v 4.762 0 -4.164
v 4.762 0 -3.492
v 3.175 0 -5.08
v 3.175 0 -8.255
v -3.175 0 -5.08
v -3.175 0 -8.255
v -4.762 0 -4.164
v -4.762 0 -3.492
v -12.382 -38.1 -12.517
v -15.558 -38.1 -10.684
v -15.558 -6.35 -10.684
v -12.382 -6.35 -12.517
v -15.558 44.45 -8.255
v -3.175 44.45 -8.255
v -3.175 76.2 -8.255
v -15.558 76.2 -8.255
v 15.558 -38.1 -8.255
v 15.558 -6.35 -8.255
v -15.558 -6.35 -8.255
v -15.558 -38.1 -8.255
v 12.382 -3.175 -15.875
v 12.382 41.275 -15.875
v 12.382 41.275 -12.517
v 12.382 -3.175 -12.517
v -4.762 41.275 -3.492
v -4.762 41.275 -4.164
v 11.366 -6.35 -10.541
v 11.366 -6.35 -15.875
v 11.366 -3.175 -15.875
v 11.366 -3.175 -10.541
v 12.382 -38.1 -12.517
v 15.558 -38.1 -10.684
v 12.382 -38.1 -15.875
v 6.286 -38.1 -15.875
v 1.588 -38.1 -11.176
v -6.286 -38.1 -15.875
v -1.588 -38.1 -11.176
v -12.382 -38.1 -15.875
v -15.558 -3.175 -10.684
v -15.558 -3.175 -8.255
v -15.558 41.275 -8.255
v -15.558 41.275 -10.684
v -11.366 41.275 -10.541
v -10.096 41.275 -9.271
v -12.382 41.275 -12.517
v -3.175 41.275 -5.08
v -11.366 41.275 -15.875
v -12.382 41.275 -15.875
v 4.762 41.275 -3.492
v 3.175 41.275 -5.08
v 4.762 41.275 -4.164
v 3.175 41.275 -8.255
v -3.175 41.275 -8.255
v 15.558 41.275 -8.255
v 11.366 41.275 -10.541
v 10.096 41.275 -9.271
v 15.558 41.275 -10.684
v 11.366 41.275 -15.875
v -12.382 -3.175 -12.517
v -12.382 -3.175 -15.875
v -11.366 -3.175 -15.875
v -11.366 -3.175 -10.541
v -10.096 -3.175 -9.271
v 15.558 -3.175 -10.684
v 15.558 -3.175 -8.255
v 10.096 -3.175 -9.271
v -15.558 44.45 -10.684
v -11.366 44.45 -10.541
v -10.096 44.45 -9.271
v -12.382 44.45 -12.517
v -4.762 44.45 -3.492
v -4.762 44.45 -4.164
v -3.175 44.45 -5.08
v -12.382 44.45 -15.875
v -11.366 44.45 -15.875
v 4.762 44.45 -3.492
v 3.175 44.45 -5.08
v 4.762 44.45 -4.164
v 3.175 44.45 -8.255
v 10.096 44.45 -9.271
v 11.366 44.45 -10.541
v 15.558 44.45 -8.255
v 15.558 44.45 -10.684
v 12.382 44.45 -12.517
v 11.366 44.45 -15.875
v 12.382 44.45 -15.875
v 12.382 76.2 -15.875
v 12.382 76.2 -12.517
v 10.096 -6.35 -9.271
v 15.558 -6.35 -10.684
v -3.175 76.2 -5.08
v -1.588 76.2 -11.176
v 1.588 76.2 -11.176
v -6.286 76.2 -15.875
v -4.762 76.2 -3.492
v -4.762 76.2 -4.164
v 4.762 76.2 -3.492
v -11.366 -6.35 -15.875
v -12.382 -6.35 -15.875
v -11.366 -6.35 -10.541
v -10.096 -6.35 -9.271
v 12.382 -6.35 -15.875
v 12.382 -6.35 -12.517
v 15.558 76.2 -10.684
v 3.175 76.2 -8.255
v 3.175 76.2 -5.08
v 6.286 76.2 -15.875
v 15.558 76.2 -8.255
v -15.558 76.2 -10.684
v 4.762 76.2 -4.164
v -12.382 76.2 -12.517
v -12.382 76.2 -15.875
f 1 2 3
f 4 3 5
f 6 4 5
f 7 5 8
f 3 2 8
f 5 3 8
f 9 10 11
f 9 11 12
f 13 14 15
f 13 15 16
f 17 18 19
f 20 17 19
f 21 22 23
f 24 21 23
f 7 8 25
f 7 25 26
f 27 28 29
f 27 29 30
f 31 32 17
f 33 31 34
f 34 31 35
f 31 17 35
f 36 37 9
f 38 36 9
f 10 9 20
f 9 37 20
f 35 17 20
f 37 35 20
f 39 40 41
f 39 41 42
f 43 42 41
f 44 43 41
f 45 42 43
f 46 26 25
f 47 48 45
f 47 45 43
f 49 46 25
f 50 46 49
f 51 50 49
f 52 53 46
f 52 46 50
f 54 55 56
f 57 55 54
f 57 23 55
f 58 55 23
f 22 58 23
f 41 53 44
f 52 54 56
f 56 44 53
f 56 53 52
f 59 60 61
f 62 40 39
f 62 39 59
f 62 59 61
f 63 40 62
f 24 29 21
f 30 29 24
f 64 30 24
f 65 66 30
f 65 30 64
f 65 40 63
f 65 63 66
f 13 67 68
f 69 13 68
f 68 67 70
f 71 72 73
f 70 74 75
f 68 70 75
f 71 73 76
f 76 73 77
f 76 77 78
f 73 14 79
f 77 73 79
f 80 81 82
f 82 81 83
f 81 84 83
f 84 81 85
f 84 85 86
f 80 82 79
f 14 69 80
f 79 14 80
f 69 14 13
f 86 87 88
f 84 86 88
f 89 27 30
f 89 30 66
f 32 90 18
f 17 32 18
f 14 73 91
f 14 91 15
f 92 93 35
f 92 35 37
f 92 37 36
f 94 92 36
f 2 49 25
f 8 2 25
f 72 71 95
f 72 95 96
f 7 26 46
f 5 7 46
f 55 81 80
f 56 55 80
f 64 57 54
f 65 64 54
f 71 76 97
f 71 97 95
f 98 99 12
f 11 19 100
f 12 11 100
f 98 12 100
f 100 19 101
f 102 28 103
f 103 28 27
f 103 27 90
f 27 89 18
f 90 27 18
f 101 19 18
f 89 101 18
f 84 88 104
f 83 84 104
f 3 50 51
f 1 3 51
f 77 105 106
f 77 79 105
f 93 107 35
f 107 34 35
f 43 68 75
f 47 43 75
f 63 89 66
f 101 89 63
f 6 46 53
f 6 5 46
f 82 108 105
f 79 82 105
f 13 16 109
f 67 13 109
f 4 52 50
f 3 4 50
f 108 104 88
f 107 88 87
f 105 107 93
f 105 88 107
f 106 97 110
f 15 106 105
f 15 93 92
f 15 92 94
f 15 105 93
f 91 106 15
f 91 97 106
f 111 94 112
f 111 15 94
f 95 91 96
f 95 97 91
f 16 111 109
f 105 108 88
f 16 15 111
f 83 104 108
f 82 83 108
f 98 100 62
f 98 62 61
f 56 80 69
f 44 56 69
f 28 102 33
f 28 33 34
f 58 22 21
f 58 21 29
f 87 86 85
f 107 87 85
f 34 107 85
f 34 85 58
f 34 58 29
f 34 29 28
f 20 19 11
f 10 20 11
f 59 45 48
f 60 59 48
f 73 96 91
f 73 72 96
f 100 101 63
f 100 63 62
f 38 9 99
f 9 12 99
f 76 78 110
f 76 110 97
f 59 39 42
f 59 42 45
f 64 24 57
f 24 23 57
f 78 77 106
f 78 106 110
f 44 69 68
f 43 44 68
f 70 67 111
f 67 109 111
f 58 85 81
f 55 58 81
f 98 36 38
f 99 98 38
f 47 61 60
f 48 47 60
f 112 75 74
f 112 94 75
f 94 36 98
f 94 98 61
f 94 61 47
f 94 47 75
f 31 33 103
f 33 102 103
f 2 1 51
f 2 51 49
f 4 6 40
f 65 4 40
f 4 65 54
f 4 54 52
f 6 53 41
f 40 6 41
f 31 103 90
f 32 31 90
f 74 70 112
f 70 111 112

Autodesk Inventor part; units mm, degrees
ref_plane "YZ Plane" through (0, 0, 0) normal (1, 0, 0) x (0, 1, 0)
ref_plane "XZ Plane" through (0, 0, 0) normal (0, 1, 0) x (-1, 0, 0)
ref_plane "XY Plane" through (0, 0, 0) normal (0, 0, 1) x (1, 0, 0)
sketch "Sketch1" plane through (0, 0, 0) normal (0, 1, 0) x (-1, 0, 0)
  line L0 (12.7, -15.875) -> (12.7, -12.7) construction
  line L1 (12.7, -12.7) -> (15.875, -10.8669) construction
  line L2 (15.875, -10.8669) -> (15.875, -7.9375) construction
  line L3 (15.875, -7.9375) -> (6.35, -7.9375) construction
  line L4 (6.35, -7.9375) -> (6.35, -3.175) construction
  line L5 (6.35, -3.175) -> (3.175, -3.175) construction
  line L6 (3.175, -3.175) -> (3.175, -6.35) construction
  line L7 (3.175, -6.35) -> (4.7625, -7.2665) construction
  line L8 (4.7625, -7.2665) -> (4.7625, -7.9375) construction
  line L9 (4.7625, -7.9375) -> (-4.7625, -7.9375) construction
  line L10 (-4.7625, -7.9375) -> (-4.7625, -7.2665) construction
  line L11 (-4.7625, -7.2665) -> (-3.175, -6.35) construction
  line L12 (-3.175, -6.35) -> (-3.175, -3.175) construction
  line L13 (-3.175, -3.175) -> (-6.35, -3.175) construction
  line L14 (-6.35, -3.175) -> (-6.35, -7.9375) construction
  line L15 (-6.35, -7.9375) -> (-15.875, -7.9375) construction
  line L16 (-15.875, -7.9375) -> (-15.875, -10.8669) construction
  line L17 (-15.875, -10.8669) -> (-12.7, -12.7) construction
  line L18 (-12.7, -12.7) -> (-12.7, -15.875) construction
  line L19 (-25.4, -15.875) -> (-12.7, -15.875) construction
  line L20 (-25.4, 0) -> (-25.4, -15.875) construction
  line L21 (25.4, 0) -> (-25.4, 0) construction
  line L22 (25.4, 0) -> (25.4, -15.875) construction
  line L23 (12.7, -15.875) -> (25.4, -15.875) construction
  line L24 (-12.3825, -15.875) -> (-12.3825, -12.5167)
  line L25 (-12.3825, -12.5167) -> (-15.5575, -10.6836)
  line L26 (-15.5575, -10.6836) -> (-15.5575, -8.255)
  line L27 (-15.5575, -8.255) -> (-6.0325, -8.255)
  line L28 (-6.0325, -8.255) -> (-6.0325, -3.4925) construction
  line L29 (-12.3825, -15.875) -> (0, -15.875)
  line L30 (0, -15.875) -> (0, -8.255)
  line L31 (-6.0325, -8.255) -> (0, -8.255)
  line L32 (0, -8.255) -> (0, -3.4925)
  line L33 (-3.175, -8.255) -> (-3.175, -5.08)
  line L34 (-3.175, -5.08) -> (-4.7625, -4.1635)
  line L35 (-4.7625, -4.1635) -> (-4.7625, -3.4925)
  line L36 (-6.0325, -3.4925) -> (-4.7625, -3.4925) construction
  line L37 (-4.7625, -3.4925) -> (0, -3.4925)
  point P0 (0, -7.9375)
  dimension "d1" = 0.3175
  dimension "d2" = 0.3175
  dimension "d3" = 0.3175
  dimension "d4" = 0.3175
  dimension "d5" = 0.3175
  dimension "d12" = 3.175
  dimension "d13" = 0.3175
  dimension "d14" = 30
extrude "Extrusion1" add sketch "Sketch1" along normal blind 76.2
extrude "Extrusion2" add sketch "Sketch1" against normal blind 38.1 contours L24 L25 L26 L27 L31 L30 L29
mirror "Mirror1" about plane through (0, 0, -8.255) normal (-1, 0, 0) of "Extrusion1", "Extrusion2"
sketch "Sketch2" plane through (0, -38.1, 0) normal (0, -1, 0) x (1, 0, 0)
  line L0 (12.3825, -15.875) -> (-12.3825, -15.875) construction
  line L1 (12.3825, -15.875) -> (12.3825, -12.5167) construction
  line L2 (12.3825, -12.5167) -> (15.5575, -10.6836) construction
  line L3 (15.5575, -10.6836) -> (15.5575, -8.255) construction
  line L4 (15.5575, -8.255) -> (-15.5575, -8.255) construction
  line L5 (-15.5575, -10.6836) -> (-15.5575, -8.255) construction
  line L6 (-12.3825, -12.5167) -> (-15.5575, -10.6836) construction
  line L7 (-12.3825, -15.875) -> (-12.3825, -12.5167) construction
  circle A0 centre (0, -16.6845) radius 5.08 construction
  line L8 (12.3825, -15.875) -> (-12.3825, -15.875) construction
  line L9 (6.2865, -15.875) -> (1.5875, -11.176)
  line L10 (1.5875, -11.176) -> (-1.5875, -11.176)
  line L11 (-1.5875, -11.176) -> (-6.2865, -15.875)
  line L12 (0, -11.176) -> (0, -15.875) construction
  line L13 (6.2865, -15.875) -> (-6.2865, -15.875)
  point P0 (0, 0)
  dimension "d15" = 10.16
  dimension "d16" = 4.699
  dimension "d17" = 45
  dimension "d18" = 3.175
extrude "Extrusion3" cut sketch "Sketch2" against normal through all
ref_plane "Work Plane1" through (0, -6.35, 0) normal (0, -1, 0) x (1, 0, 0)
sketch "Sketch3" plane through (0, -6.35, 0) normal (0, -1, 0) x (1, 0, 0)
  line L0 (-6.2865, -15.875) -> (-1.5875, -11.176) construction
  line L1 (-1.5875, -11.176) -> (1.5875, -11.176) projected
  line L2 (1.5875, -11.176) -> (6.2865, -15.875) construction
  line L3 (12.3825, -15.875) -> (6.2865, -15.875) construction
  line L4 (12.3825, -15.875) -> (12.3825, -12.5167) projected
  line L5 (12.3825, -12.5167) -> (15.5575, -10.6836) projected
  line L6 (15.5575, -10.6836) -> (15.5575, -8.255) projected
  line L7 (15.5575, -8.255) -> (-15.5575, -8.255) construction
  line L8 (-15.5575, -10.6836) -> (-15.5575, -8.255) projected
  line L9 (-12.3825, -12.5167) -> (-15.5575, -10.6836) projected
  line L10 (-12.3825, -15.875) -> (-12.3825, -12.5167) projected
  line L11 (-6.2865, -15.875) -> (-12.3825, -15.875) projected
  line L12 (12.3825, -15.875) -> (6.2865, -15.875) construction
  line L13 (11.3665, -15.875) -> (11.3665, -11.9301)
  line L14 (11.3665, -11.9301) -> (14.5415, -10.097) construction
  line L15 (14.5415, -10.097) -> (14.5415, -9.271) construction
  line L16 (14.5415, -9.271) -> (10.0965, -9.271) construction
  line L17 (0, -9.271) -> (0, -11.176) construction
  line L18 (1.5875, -11.176) -> (-1.5875, -11.176) projected
  line L19 (12.3825, -15.875) -> (11.3665, -15.875)
  line L20 (0, -9.271) -> (0, -8.255)
  line L21 (-3.175, -8.255) -> (3.175, -8.255) construction
  line L22 (15.5575, -8.255) -> (0, -8.255)
  line L23 (11.3665, -11.9301) -> (11.3665, -10.541)
  line L24 (11.3665, -10.541) -> (10.0965, -9.271)
  line L25 (10.0965, -9.271) -> (0, -9.271)
  point P0 (0, 0)
  dimension "d22" = 1.016
  dimension "d23" = 1.016
  dimension "d24" = 1.016
  dimension "d25" = 1.016
  dimension "d26" = 45
  dimension "d27" = 1.27
extrude "Extrusion4" cut sketch "Sketch3" against normal blind 3.175
ref_plane "Work Plane2" through (0, 44.45, 0) normal (0, 1, 0) x (1, 0, 0)
sketch "Sketch4" plane through (0, 44.45, 0) normal (0, 1, 0) x (1, 0, 0)
  line L0 (-1.5875, 11.176) -> (-6.2865, 15.875) construction
  line L1 (-6.2865, 15.875) -> (-12.3825, 15.875) construction
  line L2 (-12.3825, 12.5167) -> (-12.3825, 15.875) construction
  line L3 (-15.5575, 10.6836) -> (-12.3825, 12.5167) construction
  line L4 (-15.5575, 8.255) -> (-15.5575, 10.6836) construction
  line L5 (-3.175, 8.255) -> (-15.5575, 8.255) construction
  line L6 (-3.175, 5.08) -> (-3.175, 8.255) construction
  line L7 (-4.7625, 4.1635) -> (-3.175, 5.08) construction
  line L8 (-4.7625, 3.4925) -> (-4.7625, 4.1635) construction
  line L9 (4.7625, 3.4925) -> (-4.7625, 3.4925) construction
  line L10 (4.7625, 3.4925) -> (4.7625, 4.1635) projected
  line L11 (4.7625, 4.1635) -> (3.175, 5.08) projected
  line L12 (3.175, 5.08) -> (3.175, 8.255) projected
  line L13 (3.175, 8.255) -> (15.5575, 8.255) projected
  line L14 (15.5575, 8.255) -> (15.5575, 10.6836) projected
  line L15 (15.5575, 10.6836) -> (12.3825, 12.5167) projected
  line L16 (12.3825, 12.5167) -> (12.3825, 15.875) projected
  line L17 (12.3825, 15.875) -> (6.2865, 15.875) construction
  line L18 (6.2865, 15.875) -> (1.5875, 11.176) construction
  line L19 (1.5875, 11.176) -> (-1.5875, 11.176) construction
  line L20 (12.3825, 15.875) -> (6.2865, 15.875) construction
  line L21 (11.3665, 15.875) -> (11.3665, 10.541)
  line L22 (11.3665, 10.541) -> (10.0965, 9.271)
  line L23 (10.0965, 9.271) -> (0, 9.271)
  line L24 (0, 9.271) -> (0, 3.4925)
  line L25 (4.7625, 3.4925) -> (-4.7625, 3.4925) construction
  line L26 (12.3825, 15.875) -> (11.3665, 15.875)
  line L27 (4.7625, 3.4925) -> (0, 3.4925)
  point P0 (0, 0)
  dimension "d37" = 1.016
  dimension "d38" = 45
  dimension "d39" = 1.016
  dimension "d40" = 1.27
extrude "Extrusion5" cut sketch "Sketch4" against normal blind 3.175
mirror "Mirror2" about plane through (0, 0, 0) normal (1, 0, 0) of "Extrusion4", "Extrusion5"
equation "\"d2\" = d1"
equation "\"d3\" = d1"
equation "\"d4\" = d1"
equation "\"d5\" = d1"
equation "\"d13\" = d1"
equation "\"d23\" = d22"
equation "\"d24\" = d22"
equation "\"d25\" = d22"
equation "\"d37\" = d22"
equation "\"d39\" = d22"
properties part number "Holder_Slide" material "ABS Plastic"
